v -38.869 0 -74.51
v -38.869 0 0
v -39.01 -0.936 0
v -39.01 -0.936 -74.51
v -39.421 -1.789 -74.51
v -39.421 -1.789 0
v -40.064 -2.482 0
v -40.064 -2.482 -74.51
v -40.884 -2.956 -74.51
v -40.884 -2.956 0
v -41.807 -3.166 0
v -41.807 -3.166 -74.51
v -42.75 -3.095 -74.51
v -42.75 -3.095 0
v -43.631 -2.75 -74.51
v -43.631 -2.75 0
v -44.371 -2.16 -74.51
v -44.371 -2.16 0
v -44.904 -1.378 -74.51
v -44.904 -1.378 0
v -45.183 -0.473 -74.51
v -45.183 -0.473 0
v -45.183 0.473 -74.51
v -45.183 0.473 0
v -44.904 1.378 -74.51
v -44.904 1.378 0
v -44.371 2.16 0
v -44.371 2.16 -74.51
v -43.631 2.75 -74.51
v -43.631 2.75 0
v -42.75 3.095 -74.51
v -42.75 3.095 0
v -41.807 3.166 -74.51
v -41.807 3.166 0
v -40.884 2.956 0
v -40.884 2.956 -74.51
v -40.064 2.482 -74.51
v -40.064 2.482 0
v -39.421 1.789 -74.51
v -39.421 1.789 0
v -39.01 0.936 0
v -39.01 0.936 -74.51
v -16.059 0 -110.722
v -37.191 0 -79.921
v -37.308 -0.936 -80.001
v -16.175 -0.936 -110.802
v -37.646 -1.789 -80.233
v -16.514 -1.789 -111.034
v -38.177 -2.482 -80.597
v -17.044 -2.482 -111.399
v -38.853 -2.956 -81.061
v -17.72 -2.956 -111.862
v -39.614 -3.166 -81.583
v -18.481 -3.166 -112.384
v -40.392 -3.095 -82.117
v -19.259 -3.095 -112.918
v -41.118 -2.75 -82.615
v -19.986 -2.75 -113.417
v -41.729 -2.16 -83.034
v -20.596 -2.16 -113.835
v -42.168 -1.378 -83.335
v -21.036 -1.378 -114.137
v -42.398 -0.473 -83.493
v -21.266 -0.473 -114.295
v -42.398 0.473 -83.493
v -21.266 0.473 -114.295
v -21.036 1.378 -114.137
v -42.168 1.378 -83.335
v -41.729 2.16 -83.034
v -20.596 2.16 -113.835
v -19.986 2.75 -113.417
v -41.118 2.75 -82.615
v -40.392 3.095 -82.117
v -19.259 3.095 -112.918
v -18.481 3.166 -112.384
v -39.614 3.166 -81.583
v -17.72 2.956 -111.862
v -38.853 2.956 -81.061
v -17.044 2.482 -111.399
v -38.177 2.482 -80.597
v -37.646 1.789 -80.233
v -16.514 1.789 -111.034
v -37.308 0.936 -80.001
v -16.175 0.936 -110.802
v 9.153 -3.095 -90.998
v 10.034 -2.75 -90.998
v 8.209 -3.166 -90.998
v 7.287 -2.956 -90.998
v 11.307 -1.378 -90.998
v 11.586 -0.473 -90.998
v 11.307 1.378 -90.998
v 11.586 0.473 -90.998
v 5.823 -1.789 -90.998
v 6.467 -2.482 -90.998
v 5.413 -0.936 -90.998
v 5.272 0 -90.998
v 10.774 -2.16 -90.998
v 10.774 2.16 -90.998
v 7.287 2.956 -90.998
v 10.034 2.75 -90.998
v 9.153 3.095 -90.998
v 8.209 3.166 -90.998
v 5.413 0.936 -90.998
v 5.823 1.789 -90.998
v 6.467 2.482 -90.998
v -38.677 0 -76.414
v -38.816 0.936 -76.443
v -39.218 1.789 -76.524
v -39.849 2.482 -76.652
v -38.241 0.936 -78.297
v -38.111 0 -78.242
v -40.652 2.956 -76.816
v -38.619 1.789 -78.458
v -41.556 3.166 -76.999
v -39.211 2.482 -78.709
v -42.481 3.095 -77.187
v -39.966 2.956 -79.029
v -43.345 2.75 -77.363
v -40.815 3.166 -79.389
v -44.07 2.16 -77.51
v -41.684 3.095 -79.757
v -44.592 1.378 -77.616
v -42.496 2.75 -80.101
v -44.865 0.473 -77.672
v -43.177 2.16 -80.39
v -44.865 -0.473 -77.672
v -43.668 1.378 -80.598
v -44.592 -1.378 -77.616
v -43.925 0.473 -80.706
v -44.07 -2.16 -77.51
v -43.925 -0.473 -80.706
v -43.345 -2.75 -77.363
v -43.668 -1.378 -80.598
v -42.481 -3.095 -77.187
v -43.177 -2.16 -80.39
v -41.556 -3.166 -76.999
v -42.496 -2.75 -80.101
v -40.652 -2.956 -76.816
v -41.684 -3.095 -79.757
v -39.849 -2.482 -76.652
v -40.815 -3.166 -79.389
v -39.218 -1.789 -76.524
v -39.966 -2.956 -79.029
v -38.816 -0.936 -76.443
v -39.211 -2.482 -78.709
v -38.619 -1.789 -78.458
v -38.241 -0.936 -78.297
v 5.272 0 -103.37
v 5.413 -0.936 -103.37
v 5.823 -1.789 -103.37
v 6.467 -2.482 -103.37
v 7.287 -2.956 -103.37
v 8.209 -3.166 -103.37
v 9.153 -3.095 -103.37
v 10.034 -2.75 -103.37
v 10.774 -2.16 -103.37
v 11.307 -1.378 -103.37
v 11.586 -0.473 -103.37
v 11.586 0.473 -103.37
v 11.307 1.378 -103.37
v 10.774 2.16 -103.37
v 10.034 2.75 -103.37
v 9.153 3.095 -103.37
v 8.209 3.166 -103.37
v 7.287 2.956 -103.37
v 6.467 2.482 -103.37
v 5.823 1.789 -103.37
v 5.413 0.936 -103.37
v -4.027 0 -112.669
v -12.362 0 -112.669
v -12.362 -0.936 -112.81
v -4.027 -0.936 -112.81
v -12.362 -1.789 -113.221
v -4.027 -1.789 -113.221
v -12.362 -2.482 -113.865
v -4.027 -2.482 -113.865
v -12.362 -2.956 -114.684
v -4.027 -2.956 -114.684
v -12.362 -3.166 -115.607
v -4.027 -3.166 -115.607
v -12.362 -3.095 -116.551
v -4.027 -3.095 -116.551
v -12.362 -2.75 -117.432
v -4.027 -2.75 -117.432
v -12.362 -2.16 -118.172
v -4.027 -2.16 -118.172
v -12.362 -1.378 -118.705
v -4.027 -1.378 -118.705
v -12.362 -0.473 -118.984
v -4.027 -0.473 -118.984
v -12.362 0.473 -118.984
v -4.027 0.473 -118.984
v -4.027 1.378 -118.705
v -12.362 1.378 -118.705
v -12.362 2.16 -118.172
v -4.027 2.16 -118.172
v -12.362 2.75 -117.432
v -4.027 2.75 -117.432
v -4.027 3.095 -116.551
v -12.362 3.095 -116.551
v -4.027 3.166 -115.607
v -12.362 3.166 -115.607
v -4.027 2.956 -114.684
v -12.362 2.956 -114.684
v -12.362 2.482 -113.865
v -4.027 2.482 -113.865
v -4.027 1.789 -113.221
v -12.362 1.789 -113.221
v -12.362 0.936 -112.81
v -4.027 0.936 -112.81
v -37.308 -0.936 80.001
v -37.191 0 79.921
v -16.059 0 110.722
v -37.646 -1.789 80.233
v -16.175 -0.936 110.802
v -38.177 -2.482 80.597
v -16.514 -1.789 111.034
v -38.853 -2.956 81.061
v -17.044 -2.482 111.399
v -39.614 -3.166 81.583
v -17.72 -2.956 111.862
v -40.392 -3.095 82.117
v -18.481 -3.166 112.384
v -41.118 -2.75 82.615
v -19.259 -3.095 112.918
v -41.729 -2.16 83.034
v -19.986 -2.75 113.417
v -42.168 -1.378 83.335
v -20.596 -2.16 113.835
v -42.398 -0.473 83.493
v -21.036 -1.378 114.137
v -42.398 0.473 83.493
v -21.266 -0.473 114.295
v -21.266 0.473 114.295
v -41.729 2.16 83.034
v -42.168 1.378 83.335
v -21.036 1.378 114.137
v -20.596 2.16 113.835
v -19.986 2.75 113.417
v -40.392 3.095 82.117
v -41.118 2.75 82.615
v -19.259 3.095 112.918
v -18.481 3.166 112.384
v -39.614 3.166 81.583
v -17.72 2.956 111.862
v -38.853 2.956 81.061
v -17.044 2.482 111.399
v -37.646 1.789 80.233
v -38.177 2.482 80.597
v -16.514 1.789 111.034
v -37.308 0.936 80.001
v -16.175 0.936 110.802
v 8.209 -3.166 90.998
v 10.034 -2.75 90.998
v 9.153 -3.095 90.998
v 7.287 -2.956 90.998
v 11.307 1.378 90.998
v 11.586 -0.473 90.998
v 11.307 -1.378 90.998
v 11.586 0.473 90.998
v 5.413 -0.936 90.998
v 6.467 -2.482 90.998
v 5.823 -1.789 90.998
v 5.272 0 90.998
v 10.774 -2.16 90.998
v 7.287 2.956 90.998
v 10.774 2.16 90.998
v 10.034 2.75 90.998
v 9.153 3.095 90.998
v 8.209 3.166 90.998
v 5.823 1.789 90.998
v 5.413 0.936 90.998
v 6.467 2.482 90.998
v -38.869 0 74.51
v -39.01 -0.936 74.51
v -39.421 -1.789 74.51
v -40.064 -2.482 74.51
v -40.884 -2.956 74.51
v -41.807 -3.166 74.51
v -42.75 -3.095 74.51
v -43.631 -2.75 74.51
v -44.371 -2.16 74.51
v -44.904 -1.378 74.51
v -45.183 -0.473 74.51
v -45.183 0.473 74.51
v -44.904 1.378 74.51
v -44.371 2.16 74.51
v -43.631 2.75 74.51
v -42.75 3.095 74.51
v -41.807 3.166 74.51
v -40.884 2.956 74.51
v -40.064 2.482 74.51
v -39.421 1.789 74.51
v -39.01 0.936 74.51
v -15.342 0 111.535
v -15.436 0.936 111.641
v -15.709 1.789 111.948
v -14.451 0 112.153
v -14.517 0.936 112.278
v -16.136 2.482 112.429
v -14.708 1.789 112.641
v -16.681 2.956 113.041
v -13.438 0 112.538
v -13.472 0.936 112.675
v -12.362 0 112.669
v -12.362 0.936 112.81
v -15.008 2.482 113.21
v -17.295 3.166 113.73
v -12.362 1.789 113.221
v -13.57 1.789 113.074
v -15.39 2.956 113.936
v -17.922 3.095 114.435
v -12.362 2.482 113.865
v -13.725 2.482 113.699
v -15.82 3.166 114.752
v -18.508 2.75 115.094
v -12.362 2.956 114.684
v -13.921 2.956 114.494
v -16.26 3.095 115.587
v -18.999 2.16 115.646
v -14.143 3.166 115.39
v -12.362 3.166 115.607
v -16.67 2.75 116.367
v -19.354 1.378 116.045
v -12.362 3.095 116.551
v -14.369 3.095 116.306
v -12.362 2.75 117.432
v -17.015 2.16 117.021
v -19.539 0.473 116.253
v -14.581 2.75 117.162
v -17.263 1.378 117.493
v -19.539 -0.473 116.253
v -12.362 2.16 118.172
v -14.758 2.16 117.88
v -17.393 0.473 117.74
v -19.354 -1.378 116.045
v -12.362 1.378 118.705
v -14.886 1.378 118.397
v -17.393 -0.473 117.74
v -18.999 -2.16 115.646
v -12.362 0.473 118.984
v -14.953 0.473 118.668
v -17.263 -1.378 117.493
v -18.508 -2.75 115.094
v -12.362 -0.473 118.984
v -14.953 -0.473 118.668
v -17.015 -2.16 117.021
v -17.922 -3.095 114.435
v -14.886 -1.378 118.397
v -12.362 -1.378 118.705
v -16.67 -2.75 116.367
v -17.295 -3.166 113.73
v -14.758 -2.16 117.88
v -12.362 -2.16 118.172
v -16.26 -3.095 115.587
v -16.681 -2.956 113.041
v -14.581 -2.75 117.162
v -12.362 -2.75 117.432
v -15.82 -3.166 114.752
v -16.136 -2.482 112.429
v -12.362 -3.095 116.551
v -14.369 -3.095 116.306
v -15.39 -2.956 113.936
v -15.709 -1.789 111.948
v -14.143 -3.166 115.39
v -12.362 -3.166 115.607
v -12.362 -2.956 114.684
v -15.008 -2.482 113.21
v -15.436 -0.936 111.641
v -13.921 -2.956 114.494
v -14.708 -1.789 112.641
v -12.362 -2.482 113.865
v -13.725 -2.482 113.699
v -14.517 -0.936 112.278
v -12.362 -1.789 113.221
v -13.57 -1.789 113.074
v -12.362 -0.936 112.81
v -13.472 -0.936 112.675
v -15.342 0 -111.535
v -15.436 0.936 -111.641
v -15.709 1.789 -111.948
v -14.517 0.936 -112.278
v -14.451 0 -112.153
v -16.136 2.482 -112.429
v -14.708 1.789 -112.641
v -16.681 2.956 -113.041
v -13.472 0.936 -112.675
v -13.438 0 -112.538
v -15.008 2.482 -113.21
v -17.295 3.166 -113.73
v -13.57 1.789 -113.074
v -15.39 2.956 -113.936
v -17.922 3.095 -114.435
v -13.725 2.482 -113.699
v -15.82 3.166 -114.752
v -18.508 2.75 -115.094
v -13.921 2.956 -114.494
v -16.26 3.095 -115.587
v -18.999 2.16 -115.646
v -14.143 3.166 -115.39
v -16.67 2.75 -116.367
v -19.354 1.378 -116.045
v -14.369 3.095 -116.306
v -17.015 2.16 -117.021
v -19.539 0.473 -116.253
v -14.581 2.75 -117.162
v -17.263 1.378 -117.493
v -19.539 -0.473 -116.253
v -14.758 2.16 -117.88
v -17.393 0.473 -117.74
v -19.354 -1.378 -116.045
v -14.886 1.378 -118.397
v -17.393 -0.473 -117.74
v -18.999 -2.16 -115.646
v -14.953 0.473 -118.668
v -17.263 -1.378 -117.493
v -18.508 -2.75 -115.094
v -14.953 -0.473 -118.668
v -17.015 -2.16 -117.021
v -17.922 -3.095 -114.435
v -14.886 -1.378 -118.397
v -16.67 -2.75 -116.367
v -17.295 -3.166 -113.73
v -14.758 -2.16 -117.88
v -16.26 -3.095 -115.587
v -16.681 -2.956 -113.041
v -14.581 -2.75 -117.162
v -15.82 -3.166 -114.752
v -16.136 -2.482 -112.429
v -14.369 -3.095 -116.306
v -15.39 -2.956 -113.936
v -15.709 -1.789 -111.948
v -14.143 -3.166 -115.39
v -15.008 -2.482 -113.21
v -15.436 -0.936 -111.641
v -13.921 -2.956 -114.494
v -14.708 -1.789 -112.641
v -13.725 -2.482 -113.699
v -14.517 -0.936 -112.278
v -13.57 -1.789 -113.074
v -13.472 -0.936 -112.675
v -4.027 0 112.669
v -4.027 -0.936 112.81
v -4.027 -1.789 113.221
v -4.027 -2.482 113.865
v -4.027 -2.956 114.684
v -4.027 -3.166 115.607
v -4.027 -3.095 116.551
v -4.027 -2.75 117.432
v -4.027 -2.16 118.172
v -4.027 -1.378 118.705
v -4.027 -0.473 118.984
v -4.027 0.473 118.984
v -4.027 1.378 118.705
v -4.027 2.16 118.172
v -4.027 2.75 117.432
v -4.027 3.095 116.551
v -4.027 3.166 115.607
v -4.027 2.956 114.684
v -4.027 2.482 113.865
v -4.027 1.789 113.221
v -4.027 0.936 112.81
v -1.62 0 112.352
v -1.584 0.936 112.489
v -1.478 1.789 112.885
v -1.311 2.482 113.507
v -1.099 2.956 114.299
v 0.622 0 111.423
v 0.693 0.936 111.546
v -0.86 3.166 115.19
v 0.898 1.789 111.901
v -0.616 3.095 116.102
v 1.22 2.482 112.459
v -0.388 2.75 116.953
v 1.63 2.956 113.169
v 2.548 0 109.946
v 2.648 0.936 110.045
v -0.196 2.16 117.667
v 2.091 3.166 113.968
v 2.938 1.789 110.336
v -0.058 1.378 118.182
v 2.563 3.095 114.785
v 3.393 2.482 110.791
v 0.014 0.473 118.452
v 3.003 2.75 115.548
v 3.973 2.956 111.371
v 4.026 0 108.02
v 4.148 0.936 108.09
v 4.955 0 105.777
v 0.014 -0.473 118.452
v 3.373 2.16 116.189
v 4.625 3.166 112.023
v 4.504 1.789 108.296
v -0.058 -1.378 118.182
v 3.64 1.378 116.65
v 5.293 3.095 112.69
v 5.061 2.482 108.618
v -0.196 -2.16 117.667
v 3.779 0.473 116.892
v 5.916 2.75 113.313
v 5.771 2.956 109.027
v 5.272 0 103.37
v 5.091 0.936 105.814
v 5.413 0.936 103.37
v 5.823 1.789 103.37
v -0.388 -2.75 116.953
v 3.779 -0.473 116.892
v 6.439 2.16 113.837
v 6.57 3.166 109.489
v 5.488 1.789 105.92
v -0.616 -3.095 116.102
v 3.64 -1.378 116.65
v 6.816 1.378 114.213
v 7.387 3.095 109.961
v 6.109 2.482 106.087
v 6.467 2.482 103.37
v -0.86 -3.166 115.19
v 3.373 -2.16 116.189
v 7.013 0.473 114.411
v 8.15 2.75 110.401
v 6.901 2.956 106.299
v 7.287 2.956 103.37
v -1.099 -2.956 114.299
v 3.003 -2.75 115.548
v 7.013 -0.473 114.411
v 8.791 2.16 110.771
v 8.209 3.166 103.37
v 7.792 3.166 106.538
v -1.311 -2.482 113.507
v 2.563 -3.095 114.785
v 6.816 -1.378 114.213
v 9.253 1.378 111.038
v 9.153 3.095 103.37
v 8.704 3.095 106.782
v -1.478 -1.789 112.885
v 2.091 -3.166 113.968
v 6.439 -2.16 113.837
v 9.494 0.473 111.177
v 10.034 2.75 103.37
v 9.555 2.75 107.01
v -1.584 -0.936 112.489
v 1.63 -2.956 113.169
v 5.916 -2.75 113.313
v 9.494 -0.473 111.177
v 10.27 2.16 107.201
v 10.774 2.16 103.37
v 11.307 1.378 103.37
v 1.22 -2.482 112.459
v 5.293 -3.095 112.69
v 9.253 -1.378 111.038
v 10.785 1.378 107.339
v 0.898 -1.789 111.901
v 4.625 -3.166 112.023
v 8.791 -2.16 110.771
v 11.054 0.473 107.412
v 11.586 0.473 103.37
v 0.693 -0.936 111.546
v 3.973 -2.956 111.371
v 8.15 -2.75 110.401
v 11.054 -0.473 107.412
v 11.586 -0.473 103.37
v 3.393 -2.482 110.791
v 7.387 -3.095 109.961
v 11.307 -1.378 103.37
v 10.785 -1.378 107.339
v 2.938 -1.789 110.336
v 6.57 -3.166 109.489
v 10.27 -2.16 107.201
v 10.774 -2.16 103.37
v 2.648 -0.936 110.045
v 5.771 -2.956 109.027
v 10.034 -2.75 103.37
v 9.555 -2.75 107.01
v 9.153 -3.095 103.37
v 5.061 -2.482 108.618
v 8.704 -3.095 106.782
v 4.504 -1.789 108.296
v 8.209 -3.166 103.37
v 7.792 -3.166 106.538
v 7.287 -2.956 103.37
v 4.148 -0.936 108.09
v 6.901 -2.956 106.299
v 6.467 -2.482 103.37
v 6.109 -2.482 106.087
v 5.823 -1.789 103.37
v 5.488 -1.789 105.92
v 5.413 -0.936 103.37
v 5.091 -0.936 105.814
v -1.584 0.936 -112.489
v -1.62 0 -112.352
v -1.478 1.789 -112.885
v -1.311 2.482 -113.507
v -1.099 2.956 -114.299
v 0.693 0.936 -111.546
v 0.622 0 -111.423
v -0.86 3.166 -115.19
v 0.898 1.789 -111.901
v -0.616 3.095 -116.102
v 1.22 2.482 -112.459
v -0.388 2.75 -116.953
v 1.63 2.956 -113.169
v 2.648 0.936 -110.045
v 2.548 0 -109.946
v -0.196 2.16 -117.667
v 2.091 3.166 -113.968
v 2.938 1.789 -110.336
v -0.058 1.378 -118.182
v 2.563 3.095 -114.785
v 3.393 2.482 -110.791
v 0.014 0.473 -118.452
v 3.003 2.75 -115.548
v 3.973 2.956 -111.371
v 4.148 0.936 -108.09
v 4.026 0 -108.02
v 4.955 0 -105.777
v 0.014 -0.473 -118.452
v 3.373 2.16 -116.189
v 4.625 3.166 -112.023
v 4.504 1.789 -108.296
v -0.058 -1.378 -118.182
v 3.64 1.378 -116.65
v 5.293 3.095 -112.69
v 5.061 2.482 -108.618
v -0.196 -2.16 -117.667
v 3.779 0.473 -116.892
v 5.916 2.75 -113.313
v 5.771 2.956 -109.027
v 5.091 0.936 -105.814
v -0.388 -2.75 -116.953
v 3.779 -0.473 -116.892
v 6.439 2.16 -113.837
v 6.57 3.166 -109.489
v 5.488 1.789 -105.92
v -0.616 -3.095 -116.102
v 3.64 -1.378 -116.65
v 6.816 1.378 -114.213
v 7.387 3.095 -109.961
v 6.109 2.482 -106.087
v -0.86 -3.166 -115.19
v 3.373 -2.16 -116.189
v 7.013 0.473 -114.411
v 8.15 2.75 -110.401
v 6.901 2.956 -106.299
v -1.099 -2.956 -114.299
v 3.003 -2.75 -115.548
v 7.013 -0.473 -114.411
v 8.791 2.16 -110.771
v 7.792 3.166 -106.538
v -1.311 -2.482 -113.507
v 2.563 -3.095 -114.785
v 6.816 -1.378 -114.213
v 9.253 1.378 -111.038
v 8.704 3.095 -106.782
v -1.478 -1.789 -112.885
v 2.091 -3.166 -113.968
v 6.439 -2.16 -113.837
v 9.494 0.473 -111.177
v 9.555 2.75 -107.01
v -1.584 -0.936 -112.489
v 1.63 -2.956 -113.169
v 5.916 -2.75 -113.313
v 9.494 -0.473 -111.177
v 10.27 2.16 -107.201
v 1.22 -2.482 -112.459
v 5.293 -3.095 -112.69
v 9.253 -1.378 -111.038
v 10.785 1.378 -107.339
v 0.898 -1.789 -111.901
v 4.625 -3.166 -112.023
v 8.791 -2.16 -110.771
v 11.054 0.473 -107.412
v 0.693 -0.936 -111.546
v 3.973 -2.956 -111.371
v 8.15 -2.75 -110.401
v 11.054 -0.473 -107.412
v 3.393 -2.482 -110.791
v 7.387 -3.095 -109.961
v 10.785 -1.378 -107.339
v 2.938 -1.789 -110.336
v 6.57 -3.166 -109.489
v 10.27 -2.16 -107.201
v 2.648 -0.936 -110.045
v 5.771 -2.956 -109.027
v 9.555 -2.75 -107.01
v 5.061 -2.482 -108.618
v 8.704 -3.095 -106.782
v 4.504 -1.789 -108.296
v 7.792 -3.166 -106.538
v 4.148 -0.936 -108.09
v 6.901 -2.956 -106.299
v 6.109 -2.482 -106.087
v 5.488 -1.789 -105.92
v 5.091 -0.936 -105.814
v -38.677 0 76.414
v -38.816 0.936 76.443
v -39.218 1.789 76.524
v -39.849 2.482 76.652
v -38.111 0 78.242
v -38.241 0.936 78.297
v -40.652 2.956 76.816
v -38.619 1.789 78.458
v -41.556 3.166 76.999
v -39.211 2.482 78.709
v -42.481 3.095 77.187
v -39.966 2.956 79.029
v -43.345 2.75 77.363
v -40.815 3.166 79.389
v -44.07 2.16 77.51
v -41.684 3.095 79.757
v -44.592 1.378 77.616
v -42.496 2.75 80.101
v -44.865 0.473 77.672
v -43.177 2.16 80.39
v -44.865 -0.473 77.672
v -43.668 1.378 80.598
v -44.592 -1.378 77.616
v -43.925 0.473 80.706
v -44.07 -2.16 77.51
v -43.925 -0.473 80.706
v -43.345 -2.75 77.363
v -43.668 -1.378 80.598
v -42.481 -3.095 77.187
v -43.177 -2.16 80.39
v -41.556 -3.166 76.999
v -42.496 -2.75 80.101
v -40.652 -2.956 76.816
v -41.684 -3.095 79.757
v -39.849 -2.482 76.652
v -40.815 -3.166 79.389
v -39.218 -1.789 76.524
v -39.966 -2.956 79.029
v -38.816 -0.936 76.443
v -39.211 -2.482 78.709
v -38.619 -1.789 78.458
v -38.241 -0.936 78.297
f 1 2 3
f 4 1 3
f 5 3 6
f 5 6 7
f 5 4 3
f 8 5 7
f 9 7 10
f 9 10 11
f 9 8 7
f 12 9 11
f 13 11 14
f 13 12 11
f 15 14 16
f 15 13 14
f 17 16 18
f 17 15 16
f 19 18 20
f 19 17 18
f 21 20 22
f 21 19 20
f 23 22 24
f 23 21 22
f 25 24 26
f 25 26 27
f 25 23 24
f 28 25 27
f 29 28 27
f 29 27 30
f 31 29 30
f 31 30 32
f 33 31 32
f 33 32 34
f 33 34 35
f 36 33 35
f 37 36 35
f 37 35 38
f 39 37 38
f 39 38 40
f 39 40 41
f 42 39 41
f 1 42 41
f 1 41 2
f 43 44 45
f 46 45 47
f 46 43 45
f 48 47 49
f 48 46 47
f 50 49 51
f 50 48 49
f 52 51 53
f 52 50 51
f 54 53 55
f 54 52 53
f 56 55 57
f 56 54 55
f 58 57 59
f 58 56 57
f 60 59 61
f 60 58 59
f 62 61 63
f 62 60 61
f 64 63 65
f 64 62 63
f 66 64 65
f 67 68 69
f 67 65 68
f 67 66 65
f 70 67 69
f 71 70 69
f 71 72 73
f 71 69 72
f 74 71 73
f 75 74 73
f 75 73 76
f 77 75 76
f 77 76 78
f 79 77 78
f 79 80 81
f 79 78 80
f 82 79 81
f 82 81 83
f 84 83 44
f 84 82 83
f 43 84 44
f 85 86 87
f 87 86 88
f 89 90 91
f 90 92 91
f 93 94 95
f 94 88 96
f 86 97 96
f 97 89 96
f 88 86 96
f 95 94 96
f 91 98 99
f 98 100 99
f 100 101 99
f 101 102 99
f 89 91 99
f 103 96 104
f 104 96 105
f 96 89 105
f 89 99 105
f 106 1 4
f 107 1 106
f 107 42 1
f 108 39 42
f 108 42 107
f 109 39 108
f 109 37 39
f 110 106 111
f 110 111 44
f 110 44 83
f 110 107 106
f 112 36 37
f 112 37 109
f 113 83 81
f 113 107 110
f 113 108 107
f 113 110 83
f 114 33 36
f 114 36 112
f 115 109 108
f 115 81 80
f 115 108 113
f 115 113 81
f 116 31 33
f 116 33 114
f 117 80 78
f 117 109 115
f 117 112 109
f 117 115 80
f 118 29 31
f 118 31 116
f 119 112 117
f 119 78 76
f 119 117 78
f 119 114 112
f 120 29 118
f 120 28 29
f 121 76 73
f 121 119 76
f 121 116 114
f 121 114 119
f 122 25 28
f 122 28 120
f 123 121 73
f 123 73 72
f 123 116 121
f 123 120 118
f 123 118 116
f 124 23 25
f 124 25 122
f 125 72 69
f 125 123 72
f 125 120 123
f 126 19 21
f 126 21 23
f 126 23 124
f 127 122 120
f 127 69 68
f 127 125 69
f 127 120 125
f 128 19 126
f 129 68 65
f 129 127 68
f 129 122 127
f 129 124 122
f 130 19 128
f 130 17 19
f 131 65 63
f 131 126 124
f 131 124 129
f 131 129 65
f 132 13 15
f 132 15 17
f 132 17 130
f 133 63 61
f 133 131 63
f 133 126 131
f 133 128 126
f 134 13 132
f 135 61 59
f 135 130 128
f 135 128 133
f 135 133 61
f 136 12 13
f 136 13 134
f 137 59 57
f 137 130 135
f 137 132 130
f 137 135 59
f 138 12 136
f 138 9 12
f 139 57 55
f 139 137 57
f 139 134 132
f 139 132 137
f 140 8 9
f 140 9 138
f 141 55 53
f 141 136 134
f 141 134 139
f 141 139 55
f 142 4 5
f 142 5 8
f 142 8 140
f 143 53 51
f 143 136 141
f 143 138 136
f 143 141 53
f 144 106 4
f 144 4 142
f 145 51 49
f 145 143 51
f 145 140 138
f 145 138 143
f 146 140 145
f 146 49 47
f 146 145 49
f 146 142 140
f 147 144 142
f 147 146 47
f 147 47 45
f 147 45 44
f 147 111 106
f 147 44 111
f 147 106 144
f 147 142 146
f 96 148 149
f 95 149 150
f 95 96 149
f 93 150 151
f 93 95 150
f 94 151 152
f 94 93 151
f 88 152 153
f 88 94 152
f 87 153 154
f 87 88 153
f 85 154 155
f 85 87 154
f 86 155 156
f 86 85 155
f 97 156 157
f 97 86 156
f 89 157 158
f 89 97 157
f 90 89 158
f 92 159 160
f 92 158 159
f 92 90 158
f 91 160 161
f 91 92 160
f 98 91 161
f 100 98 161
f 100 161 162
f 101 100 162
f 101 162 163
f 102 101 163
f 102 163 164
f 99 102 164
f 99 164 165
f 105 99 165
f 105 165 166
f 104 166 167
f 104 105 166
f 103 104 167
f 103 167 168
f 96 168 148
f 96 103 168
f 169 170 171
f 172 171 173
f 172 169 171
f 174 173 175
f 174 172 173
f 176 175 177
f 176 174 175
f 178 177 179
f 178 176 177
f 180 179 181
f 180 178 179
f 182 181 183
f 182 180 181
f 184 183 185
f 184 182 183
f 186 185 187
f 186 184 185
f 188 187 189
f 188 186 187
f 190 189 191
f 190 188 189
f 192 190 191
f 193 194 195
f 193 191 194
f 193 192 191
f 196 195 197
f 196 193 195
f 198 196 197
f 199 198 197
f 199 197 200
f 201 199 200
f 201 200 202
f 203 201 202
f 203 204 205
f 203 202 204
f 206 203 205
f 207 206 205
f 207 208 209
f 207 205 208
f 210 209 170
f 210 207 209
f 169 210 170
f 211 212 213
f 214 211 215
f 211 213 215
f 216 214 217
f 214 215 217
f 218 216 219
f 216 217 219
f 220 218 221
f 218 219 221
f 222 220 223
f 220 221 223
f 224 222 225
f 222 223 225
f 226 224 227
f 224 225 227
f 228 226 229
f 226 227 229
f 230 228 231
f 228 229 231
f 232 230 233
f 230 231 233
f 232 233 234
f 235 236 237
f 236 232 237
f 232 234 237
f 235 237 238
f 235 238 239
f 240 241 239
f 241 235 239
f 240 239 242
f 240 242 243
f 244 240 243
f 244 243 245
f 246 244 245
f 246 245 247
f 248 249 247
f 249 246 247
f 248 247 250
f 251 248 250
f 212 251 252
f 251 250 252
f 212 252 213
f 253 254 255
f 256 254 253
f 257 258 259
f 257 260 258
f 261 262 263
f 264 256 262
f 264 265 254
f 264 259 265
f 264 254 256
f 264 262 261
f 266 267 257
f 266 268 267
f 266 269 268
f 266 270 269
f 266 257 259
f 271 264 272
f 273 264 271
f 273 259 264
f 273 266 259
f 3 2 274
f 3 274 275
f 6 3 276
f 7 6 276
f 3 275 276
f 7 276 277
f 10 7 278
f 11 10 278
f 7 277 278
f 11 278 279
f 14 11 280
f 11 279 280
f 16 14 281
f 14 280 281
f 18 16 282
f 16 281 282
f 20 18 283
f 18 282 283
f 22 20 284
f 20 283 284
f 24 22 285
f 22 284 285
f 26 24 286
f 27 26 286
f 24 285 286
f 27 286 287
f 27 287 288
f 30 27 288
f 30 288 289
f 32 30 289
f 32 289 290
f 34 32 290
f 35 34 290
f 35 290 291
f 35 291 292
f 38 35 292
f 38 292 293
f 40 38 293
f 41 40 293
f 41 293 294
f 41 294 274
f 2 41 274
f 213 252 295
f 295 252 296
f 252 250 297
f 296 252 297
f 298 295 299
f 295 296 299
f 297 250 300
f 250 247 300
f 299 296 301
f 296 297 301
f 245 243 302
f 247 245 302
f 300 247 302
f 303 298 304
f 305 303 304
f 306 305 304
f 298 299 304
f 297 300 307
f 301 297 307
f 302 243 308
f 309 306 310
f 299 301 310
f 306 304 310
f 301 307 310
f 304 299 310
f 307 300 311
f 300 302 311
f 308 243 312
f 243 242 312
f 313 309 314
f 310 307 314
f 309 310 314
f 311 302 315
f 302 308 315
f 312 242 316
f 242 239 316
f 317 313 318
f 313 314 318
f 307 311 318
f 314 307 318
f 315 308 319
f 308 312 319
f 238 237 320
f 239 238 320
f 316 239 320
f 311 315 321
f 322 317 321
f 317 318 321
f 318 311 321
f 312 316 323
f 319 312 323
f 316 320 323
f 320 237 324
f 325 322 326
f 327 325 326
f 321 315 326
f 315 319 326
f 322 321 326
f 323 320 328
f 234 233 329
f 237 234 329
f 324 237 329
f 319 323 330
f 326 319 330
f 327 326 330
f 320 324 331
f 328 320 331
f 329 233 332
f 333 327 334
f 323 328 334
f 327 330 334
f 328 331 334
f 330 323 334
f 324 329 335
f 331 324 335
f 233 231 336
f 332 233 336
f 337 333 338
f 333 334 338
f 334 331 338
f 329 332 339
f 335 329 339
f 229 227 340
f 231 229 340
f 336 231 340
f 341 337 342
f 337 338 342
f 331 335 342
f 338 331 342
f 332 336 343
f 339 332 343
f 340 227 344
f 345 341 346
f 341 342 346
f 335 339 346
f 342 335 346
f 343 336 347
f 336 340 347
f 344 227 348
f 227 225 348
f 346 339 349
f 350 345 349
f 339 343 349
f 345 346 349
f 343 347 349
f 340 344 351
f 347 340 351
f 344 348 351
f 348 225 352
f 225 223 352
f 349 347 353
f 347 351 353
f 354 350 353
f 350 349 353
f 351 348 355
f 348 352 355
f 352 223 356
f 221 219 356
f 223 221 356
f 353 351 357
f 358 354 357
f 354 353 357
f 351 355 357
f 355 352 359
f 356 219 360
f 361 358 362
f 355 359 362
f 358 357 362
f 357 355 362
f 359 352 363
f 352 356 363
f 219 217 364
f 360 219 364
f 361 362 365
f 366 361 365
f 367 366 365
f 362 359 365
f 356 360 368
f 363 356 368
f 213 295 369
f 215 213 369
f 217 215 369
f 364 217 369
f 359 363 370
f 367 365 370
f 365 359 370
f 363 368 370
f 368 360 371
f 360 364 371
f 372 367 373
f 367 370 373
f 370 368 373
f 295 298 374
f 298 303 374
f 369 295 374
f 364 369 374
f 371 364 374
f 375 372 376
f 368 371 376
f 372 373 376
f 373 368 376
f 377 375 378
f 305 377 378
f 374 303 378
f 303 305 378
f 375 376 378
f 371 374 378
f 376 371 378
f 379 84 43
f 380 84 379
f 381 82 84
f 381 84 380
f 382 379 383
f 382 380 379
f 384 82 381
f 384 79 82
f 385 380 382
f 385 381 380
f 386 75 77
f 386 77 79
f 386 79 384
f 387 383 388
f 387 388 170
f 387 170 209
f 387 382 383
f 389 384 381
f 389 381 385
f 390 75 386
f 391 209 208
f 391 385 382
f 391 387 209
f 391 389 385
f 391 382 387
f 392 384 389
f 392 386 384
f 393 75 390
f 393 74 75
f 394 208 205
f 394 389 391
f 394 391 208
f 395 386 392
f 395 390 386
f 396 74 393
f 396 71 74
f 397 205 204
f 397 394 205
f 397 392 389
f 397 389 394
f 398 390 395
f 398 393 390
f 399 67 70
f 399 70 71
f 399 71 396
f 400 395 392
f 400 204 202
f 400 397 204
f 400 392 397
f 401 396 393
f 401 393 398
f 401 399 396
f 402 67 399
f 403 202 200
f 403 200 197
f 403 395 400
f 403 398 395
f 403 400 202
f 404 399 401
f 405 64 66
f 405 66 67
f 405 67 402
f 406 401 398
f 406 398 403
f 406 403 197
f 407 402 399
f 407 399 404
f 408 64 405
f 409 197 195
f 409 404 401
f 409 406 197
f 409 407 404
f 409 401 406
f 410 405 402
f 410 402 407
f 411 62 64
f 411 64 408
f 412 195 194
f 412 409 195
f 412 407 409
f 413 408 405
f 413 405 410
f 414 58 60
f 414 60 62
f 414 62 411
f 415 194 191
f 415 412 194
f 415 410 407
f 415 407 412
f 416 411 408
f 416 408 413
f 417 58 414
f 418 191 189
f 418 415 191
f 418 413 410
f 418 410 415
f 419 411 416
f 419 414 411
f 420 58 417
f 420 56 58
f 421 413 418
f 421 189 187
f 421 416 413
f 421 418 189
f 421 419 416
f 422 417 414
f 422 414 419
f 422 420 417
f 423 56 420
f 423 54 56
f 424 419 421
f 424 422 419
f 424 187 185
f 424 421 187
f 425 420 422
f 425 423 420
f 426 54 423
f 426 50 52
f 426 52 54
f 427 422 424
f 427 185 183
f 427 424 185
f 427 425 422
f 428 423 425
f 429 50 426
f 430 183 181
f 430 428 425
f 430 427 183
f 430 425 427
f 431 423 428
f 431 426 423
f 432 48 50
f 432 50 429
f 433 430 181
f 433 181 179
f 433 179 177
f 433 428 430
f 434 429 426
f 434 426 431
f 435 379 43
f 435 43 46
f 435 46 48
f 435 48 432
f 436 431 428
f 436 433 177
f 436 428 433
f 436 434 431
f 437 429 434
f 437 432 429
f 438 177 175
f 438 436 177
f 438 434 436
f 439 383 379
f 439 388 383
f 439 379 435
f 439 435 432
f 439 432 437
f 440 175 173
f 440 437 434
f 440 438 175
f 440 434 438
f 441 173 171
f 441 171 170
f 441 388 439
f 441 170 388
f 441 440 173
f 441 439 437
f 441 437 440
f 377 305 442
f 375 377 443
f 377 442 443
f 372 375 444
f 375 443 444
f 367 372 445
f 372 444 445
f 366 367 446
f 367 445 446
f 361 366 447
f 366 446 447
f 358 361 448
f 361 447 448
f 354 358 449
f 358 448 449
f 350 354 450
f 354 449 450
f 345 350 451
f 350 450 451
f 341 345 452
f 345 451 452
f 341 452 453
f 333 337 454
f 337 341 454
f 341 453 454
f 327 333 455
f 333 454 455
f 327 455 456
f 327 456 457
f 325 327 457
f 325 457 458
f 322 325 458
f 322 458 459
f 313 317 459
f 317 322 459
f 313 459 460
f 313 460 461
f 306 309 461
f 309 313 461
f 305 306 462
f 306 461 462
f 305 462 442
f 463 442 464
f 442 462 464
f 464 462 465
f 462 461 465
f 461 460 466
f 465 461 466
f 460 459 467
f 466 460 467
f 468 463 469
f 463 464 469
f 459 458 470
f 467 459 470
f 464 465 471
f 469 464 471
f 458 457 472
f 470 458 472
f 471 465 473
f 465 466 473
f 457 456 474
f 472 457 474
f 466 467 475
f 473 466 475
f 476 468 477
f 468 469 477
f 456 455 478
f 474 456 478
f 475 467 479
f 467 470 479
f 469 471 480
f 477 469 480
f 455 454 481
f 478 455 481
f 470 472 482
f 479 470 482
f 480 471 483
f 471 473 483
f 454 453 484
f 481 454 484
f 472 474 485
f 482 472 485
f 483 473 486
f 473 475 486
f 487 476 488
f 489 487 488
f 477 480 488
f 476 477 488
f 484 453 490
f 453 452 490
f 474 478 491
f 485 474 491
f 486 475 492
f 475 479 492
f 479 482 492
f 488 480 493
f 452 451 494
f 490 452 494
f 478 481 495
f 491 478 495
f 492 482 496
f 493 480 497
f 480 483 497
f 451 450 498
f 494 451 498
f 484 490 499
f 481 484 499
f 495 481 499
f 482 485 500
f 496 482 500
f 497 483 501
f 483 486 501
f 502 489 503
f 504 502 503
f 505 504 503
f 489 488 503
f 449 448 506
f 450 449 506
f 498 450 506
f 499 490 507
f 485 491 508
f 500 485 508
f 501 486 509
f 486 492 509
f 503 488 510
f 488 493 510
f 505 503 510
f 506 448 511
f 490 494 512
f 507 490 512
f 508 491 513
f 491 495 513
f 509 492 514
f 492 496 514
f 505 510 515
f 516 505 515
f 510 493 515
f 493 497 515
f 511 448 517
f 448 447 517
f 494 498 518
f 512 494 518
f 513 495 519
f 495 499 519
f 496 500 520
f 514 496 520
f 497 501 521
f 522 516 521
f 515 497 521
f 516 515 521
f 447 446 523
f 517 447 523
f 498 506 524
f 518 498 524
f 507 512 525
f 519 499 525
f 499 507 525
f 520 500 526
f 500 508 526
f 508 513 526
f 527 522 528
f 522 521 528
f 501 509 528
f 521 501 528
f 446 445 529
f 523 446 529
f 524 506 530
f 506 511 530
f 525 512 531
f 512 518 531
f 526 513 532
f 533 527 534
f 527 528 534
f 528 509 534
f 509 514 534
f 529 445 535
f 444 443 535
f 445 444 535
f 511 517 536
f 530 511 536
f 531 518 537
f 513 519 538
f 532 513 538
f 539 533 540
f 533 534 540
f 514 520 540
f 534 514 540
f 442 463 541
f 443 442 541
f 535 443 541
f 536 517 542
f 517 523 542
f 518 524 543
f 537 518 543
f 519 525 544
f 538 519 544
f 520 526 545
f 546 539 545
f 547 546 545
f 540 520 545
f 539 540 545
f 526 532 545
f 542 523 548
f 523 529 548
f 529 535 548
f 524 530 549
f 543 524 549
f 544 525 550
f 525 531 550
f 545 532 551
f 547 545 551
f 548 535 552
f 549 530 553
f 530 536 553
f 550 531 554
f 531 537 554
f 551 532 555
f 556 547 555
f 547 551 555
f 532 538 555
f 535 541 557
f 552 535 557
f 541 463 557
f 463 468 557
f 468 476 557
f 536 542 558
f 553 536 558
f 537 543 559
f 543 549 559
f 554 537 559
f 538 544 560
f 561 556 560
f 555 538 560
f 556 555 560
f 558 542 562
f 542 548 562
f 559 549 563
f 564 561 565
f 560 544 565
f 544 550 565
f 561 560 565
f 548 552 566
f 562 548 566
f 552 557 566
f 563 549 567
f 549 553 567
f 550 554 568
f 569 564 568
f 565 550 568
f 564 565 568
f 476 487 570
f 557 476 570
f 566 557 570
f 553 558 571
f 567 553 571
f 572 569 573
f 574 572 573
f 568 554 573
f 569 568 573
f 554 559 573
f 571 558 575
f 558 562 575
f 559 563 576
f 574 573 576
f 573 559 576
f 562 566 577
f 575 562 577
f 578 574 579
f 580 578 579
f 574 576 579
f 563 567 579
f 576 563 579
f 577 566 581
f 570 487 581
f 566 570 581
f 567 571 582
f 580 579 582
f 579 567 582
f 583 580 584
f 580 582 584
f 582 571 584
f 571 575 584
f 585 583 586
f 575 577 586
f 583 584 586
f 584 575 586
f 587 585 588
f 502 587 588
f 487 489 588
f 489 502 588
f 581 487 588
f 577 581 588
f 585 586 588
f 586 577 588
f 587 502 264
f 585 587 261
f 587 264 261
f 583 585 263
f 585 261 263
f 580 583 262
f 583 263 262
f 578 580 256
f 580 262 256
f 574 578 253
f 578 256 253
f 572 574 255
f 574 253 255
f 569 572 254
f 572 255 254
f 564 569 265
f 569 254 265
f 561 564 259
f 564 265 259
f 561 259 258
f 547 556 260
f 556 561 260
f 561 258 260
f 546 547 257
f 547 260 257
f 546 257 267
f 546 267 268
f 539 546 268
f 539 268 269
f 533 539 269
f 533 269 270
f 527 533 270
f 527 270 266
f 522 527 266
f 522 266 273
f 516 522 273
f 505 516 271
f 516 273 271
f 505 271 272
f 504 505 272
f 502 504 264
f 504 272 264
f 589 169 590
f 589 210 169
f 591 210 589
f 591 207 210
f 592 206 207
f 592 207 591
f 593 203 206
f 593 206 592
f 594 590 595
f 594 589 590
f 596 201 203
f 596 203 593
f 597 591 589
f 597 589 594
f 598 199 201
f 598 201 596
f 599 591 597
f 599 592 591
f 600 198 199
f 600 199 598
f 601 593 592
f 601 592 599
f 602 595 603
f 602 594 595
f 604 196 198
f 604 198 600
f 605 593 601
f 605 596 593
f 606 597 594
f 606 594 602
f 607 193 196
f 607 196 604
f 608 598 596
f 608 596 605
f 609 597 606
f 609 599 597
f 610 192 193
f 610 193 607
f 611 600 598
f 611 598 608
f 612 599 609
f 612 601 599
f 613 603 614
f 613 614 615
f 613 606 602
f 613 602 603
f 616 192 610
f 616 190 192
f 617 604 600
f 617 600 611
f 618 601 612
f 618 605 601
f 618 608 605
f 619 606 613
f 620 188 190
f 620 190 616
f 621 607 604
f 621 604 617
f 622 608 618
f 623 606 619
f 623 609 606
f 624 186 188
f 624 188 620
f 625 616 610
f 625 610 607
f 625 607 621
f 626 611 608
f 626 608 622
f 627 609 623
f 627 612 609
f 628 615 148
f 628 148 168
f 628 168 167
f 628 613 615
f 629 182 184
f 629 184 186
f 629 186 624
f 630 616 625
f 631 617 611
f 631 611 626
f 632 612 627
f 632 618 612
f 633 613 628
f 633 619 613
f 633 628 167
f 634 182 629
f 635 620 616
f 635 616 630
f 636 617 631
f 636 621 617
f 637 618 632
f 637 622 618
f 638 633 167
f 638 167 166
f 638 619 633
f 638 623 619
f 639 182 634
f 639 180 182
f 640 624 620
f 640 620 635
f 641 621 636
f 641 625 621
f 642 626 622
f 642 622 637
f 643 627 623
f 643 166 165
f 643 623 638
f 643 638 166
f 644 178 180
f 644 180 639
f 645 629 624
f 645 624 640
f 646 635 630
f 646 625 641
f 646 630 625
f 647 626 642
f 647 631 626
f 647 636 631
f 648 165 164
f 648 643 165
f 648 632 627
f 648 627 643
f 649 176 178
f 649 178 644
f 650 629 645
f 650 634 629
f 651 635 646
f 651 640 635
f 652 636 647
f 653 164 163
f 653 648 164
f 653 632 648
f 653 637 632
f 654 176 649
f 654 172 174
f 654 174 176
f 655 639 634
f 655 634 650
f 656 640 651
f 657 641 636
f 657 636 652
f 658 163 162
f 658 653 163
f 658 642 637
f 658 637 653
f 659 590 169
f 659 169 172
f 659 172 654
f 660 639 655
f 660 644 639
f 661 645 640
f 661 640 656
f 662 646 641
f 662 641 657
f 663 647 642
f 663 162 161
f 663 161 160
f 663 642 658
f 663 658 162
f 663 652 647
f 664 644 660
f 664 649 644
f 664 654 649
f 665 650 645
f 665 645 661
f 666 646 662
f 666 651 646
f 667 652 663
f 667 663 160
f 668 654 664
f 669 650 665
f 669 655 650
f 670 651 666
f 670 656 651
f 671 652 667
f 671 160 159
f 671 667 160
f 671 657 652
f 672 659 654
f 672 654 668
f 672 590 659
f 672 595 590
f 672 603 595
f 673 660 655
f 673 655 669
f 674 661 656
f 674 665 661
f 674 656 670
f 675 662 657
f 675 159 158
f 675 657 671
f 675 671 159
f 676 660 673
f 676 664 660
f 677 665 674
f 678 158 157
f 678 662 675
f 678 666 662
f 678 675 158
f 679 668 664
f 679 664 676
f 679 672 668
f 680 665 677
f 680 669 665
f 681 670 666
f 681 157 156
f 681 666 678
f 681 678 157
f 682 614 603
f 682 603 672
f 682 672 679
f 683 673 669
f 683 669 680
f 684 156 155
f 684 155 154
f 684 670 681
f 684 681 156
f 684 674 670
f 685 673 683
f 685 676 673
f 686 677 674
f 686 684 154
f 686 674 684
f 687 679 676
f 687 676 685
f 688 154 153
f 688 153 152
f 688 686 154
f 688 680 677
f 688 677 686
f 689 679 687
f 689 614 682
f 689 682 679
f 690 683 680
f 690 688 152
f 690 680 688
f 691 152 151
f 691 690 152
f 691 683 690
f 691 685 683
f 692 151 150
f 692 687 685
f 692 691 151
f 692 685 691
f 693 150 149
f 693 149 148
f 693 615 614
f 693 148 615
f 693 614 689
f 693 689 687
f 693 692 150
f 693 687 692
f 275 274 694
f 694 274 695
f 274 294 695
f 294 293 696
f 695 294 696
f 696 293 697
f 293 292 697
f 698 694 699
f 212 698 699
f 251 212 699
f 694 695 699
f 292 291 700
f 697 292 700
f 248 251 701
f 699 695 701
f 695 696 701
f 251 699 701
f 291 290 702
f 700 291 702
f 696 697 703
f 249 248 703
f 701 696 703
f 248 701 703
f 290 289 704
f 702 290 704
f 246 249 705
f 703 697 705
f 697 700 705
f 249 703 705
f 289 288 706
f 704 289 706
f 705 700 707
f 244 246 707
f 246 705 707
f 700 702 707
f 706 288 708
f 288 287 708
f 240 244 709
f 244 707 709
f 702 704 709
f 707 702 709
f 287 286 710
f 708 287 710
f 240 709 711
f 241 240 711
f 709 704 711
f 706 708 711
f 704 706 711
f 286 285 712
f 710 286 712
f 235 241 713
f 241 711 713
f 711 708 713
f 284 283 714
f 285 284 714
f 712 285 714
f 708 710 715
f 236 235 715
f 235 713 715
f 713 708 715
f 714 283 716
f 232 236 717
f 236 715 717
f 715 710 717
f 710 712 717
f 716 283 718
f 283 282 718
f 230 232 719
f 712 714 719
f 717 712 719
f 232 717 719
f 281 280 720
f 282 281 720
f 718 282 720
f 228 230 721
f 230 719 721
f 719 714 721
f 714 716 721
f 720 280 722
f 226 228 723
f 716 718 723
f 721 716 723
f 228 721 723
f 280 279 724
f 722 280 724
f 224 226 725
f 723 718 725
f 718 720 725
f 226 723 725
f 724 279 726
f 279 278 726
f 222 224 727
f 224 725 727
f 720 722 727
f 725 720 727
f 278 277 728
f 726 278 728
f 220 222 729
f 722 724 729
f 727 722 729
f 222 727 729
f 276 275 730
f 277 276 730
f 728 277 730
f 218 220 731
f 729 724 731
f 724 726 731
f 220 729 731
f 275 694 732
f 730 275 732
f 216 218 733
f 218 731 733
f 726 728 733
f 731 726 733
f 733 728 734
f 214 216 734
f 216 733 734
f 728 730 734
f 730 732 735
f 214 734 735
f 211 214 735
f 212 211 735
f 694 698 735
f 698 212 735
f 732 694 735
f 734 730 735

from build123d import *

# Parameters (mm, degrees)
SKETCH3_R = 3.175


with BuildPart() as part:
    # Sweep1: sweep along a path in Sketch2
    with BuildLine(Plane(origin=(0, 0, 0), x_dir=(1, 0, 0), z_dir=(0, 1, 0))) as sweep1_path:
        Line((-42.005520706, 0), (-42.005520706, 74.510370248))
        ThreePointArc((-42.005520706, 74.510370248), (-41.43579821, 78.271535981), (-39.777746269, 81.695249631))
        Line((-39.777746269, 81.695249631), (-18.645117879, 112.496831598))
        ThreePointArc((-18.645117879, 112.496831598), (-15.912495952, 114.928072333), (-12.361782541, 115.805903968))
        Line((-12.361782541, 115.805903968), (-4.027166859, 115.805903968))
        ThreePointArc((-4.027166859, 115.805903968), (4.766000348, 112.163654854), (8.408249461, 103.370487647))
        Line((8.408249461, 103.370487647), (8.408249461, 90.998440491))
    # Sketch3 → Sweep1 (sweep)
    with BuildSketch(Plane.XY):
        with Locations((-42.04385452, 0)):
            Circle(SKETCH3_R)
    sweep1 = sweep(path=sweep1_path.line)

    # Mirror2: Sweep1 across plane
    add(sweep1.mirror(Plane(origin=(-42.04385452, 0, 0), x_dir=(1, 0, 0), z_dir=(0, 0, 1))))


solid = part.part
